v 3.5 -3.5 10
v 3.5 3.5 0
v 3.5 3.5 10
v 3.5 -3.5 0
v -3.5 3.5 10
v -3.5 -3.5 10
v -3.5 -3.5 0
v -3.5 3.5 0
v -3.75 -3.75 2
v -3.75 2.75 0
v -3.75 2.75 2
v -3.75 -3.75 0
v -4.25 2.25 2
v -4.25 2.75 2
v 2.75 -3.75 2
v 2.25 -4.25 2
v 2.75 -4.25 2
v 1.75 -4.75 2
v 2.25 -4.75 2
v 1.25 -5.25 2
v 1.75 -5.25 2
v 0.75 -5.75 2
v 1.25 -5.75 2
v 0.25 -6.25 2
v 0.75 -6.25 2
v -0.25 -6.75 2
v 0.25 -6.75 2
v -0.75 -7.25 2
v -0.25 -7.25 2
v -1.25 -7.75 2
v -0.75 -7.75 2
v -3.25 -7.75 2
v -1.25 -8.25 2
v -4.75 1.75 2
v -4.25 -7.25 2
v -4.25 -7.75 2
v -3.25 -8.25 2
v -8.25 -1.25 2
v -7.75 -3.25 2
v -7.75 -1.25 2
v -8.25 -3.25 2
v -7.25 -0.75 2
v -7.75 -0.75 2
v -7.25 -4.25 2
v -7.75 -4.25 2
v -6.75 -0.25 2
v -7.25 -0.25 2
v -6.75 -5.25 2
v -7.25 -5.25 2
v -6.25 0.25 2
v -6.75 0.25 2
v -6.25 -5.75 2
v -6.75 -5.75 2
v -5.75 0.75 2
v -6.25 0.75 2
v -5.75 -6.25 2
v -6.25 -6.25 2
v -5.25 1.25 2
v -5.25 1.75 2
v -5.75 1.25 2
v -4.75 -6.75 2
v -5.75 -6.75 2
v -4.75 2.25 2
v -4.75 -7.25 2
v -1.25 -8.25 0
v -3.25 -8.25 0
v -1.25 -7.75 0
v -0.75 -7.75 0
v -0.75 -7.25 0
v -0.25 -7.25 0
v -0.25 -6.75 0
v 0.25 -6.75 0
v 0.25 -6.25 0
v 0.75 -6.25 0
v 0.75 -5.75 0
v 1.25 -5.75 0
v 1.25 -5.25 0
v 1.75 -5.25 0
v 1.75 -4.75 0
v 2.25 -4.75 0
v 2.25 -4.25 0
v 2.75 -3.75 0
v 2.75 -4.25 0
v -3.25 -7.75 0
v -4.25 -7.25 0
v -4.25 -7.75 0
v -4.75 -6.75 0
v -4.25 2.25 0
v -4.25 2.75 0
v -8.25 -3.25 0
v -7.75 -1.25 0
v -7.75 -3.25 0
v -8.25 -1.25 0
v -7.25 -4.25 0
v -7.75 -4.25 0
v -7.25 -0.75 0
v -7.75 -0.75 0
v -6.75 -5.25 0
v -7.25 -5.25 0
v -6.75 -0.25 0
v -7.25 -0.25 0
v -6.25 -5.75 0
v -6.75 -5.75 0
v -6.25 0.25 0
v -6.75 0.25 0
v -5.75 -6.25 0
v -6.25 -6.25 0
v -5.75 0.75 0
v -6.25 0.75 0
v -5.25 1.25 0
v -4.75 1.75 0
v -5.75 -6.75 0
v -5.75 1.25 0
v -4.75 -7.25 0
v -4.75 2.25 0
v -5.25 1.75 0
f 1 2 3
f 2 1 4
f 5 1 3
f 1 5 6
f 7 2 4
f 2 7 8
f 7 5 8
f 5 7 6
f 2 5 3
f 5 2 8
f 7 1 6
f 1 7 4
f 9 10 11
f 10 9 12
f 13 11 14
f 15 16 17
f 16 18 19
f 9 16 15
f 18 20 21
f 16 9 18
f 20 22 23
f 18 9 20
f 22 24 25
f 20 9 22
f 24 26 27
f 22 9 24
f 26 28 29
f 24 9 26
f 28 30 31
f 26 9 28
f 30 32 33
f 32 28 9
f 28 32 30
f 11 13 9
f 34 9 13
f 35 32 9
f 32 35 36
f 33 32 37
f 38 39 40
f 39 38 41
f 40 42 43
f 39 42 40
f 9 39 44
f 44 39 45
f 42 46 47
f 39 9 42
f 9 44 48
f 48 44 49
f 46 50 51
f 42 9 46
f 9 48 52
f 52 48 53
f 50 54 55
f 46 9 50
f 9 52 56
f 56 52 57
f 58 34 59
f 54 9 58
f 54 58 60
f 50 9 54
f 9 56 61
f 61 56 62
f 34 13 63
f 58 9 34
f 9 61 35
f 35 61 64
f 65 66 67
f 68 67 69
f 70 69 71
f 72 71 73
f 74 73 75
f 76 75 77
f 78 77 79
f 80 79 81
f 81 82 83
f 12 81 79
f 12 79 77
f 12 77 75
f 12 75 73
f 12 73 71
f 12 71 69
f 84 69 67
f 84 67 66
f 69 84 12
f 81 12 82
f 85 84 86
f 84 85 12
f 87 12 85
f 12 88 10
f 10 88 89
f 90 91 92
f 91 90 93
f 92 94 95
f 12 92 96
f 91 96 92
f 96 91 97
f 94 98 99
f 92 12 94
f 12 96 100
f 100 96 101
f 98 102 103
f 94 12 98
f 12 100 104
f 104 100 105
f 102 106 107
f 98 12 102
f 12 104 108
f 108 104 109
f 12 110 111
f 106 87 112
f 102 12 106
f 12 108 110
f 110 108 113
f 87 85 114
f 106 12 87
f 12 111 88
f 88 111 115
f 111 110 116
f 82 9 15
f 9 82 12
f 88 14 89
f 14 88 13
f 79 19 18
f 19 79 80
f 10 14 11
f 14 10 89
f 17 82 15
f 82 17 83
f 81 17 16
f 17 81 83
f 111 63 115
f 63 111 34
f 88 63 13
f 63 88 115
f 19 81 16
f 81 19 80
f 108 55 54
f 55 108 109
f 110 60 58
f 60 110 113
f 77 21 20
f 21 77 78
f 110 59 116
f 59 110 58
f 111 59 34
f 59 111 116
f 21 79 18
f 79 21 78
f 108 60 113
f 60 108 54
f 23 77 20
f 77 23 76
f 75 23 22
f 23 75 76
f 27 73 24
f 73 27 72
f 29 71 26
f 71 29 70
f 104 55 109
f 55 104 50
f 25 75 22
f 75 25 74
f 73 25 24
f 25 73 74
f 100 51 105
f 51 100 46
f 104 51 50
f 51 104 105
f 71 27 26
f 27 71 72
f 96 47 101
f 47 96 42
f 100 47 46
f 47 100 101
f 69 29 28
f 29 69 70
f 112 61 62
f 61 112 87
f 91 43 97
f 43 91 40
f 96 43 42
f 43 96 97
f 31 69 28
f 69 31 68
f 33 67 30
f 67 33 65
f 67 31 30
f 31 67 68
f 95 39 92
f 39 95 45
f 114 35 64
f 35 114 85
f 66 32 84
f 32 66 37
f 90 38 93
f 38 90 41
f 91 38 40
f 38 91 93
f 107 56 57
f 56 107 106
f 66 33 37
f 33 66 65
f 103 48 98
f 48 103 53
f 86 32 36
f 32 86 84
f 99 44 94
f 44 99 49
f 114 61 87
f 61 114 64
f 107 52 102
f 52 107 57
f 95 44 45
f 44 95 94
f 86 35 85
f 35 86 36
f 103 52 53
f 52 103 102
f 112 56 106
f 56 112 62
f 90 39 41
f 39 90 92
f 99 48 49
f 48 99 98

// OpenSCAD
translate([0, 0, 5]) color([0,1,0,0.9]) cube([7, 7, 10], center=true);
translate([-4.0, 0.0, 1]) color([1,0,0]) cube([0.5, 0.5, 2], center=true);
translate([0.0, -4.0, 1]) color([1,0,0]) cube([0.5, 0.5, 2], center=true);
translate([-4.0, -0.5, 1]) color([1,0,0]) cube([0.5, 0.5, 2], center=true);
translate([-4.0, 0.5, 1]) color([1,0,0]) cube([0.5, 0.5, 2], center=true);
translate([-0.5, -4.0, 1]) color([1,0,0]) cube([0.5, 0.5, 2], center=true);
translate([0.5, -4.0, 1]) color([1,0,0]) cube([0.5, 0.5, 2], center=true);
translate([-4.0, -1.0, 1]) color([1,0,0]) cube([0.5, 0.5, 2], center=true);
translate([-4.0, 1.0, 1]) color([1,0,0]) cube([0.5, 0.5, 2], center=true);
translate([-1.0, -4.0, 1]) color([1,0,0]) cube([0.5, 0.5, 2], center=true);
translate([1.0, -4.0, 1]) color([1,0,0]) cube([0.5, 0.5, 2], center=true);
translate([-4.0, -1.5, 1]) color([1,0,0]) cube([0.5, 0.5, 2], center=true);
translate([-4.0, 1.5, 1]) color([1,0,0]) cube([0.5, 0.5, 2], center=true);
translate([-1.5, -4.0, 1]) color([1,0,0]) cube([0.5, 0.5, 2], center=true);
translate([1.5, -4.0, 1]) color([1,0,0]) cube([0.5, 0.5, 2], center=true);
translate([-4.0, -2.0, 1]) color([1,0,0]) cube([0.5, 0.5, 2], center=true);
translate([-4.0, 2.0, 1]) color([1,0,0]) cube([0.5, 0.5, 2], center=true);
translate([-2.0, -4.0, 1]) color([1,0,0]) cube([0.5, 0.5, 2], center=true);
translate([2.0, -4.0, 1]) color([1,0,0]) cube([0.5, 0.5, 2], center=true);
translate([-4.5, 0.0, 1]) color([1,0,0]) cube([0.5, 0.5, 2], center=true);
translate([0.0, -4.5, 1]) color([1,0,0]) cube([0.5, 0.5, 2], center=true);
translate([-4.5, -0.5, 1]) color([1,0,0]) cube([0.5, 0.5, 2], center=true);
translate([-4.5, 0.5, 1]) color([1,0,0]) cube([0.5, 0.5, 2], center=true);
translate([-0.5, -4.5, 1]) color([1,0,0]) cube([0.5, 0.5, 2], center=true);
translate([0.5, -4.5, 1]) color([1,0,0]) cube([0.5, 0.5, 2], center=true);
translate([-4.5, -1.0, 1]) color([1,0,0]) cube([0.5, 0.5, 2], center=true);
translate([-4.5, 1.0, 1]) color([1,0,0]) cube([0.5, 0.5, 2], center=true);
translate([-1.0, -4.5, 1]) color([1,0,0]) cube([0.5, 0.5, 2], center=true);
translate([1.0, -4.5, 1]) color([1,0,0]) cube([0.5, 0.5, 2], center=true);
translate([-4.0, -2.5, 1]) color([1,0,0]) cube([0.5, 0.5, 2], center=true);
translate([-4.0, 2.5, 1]) color([1,0,0]) cube([0.5, 0.5, 2], center=true);
translate([-2.5, -4.0, 1]) color([1,0,0]) cube([0.5, 0.5, 2], center=true);
translate([2.5, -4.0, 1]) color([1,0,0]) cube([0.5, 0.5, 2], center=true);
translate([-4.5, -1.5, 1]) color([1,0,0]) cube([0.5, 0.5, 2], center=true);
translate([-4.5, 1.5, 1]) color([1,0,0]) cube([0.5, 0.5, 2], center=true);
translate([-1.5, -4.5, 1]) color([1,0,0]) cube([0.5, 0.5, 2], center=true);
translate([1.5, -4.5, 1]) color([1,0,0]) cube([0.5, 0.5, 2], center=true);
translate([-4.5, -2.0, 1]) color([1,0,0]) cube([0.5, 0.5, 2], center=true);
translate([-4.5, 2.0, 1]) color([1,0,0]) cube([0.5, 0.5, 2], center=true);
translate([-2.0, -4.5, 1]) color([1,0,0]) cube([0.5, 0.5, 2], center=true);
translate([2.0, -4.5, 1]) color([1,0,0]) cube([0.5, 0.5, 2], center=true);
translate([-5.0, 0.0, 1]) color([1,0,0]) cube([0.5, 0.5, 2], center=true);
translate([-4.0, -3.0, 1]) color([1,0,0]) cube([0.5, 0.5, 2], center=true);
translate([-3.0, -4.0, 1]) color([1,0,0]) cube([0.5, 0.5, 2], center=true);
translate([0.0, -5.0, 1]) color([1,0,0]) cube([0.5, 0.5, 2], center=true);
translate([-5.0, -0.5, 1]) color([1,0,0]) cube([0.5, 0.5, 2], center=true);
translate([-5.0, 0.5, 1]) color([1,0,0]) cube([0.5, 0.5, 2], center=true);
translate([-0.5, -5.0, 1]) color([1,0,0]) cube([0.5, 0.5, 2], center=true);
translate([0.5, -5.0, 1]) color([1,0,0]) cube([0.5, 0.5, 2], center=true);
translate([-5.0, -1.0, 1]) color([1,0,0]) cube([0.5, 0.5, 2], center=true);
translate([-5.0, 1.0, 1]) color([1,0,0]) cube([0.5, 0.5, 2], center=true);
translate([-1.0, -5.0, 1]) color([1,0,0]) cube([0.5, 0.5, 2], center=true);
translate([1.0, -5.0, 1]) color([1,0,0]) cube([0.5, 0.5, 2], center=true);
translate([-4.5, -2.5, 1]) color([1,0,0]) cube([0.5, 0.5, 2], center=true);
translate([-2.5, -4.5, 1]) color([1,0,0]) cube([0.5, 0.5, 2], center=true);
translate([-5.0, -1.5, 1]) color([1,0,0]) cube([0.5, 0.5, 2], center=true);
translate([-5.0, 1.5, 1]) color([1,0,0]) cube([0.5, 0.5, 2], center=true);
translate([-1.5, -5.0, 1]) color([1,0,0]) cube([0.5, 0.5, 2], center=true);
translate([1.5, -5.0, 1]) color([1,0,0]) cube([0.5, 0.5, 2], center=true);
translate([-4.0, -3.5, 1]) color([1,0,0]) cube([0.5, 0.5, 2], center=true);
translate([-3.5, -4.0, 1]) color([1,0,0]) cube([0.5, 0.5, 2], center=true);
translate([-5.0, -2.0, 1]) color([1,0,0]) cube([0.5, 0.5, 2], center=true);
translate([-2.0, -5.0, 1]) color([1,0,0]) cube([0.5, 0.5, 2], center=true);
translate([-4.5, -3.0, 1]) color([1,0,0]) cube([0.5, 0.5, 2], center=true);
translate([-3.0, -4.5, 1]) color([1,0,0]) cube([0.5, 0.5, 2], center=true);
translate([-5.5, 0.0, 1]) color([1,0,0]) cube([0.5, 0.5, 2], center=true);
translate([0.0, -5.5, 1]) color([1,0,0]) cube([0.5, 0.5, 2], center=true);
translate([-5.5, -0.5, 1]) color([1,0,0]) cube([0.5, 0.5, 2], center=true);
translate([-5.5, 0.5, 1]) color([1,0,0]) cube([0.5, 0.5, 2], center=true);
translate([-0.5, -5.5, 1]) color([1,0,0]) cube([0.5, 0.5, 2], center=true);
translate([0.5, -5.5, 1]) color([1,0,0]) cube([0.5, 0.5, 2], center=true);
translate([-5.5, -1.0, 1]) color([1,0,0]) cube([0.5, 0.5, 2], center=true);
translate([-5.5, 1.0, 1]) color([1,0,0]) cube([0.5, 0.5, 2], center=true);
translate([-5.0, -2.5, 1]) color([1,0,0]) cube([0.5, 0.5, 2], center=true);
translate([-2.5, -5.0, 1]) color([1,0,0]) cube([0.5, 0.5, 2], center=true);
translate([-1.0, -5.5, 1]) color([1,0,0]) cube([0.5, 0.5, 2], center=true);
translate([1.0, -5.5, 1]) color([1,0,0]) cube([0.5, 0.5, 2], center=true);
translate([-4.0, -4.0, 1]) color([1,0,0]) cube([0.5, 0.5, 2], center=true);
translate([-5.5, -1.5, 1]) color([1,0,0]) cube([0.5, 0.5, 2], center=true);
translate([-4.5, -3.5, 1]) color([1,0,0]) cube([0.5, 0.5, 2], center=true);
translate([-3.5, -4.5, 1]) color([1,0,0]) cube([0.5, 0.5, 2], center=true);
translate([-1.5, -5.5, 1]) color([1,0,0]) cube([0.5, 0.5, 2], center=true);
translate([-5.0, -3.0, 1]) color([1,0,0]) cube([0.5, 0.5, 2], center=true);
translate([-3.0, -5.0, 1]) color([1,0,0]) cube([0.5, 0.5, 2], center=true);
translate([-5.5, -2.0, 1]) color([1,0,0]) cube([0.5, 0.5, 2], center=true);
translate([-2.0, -5.5, 1]) color([1,0,0]) cube([0.5, 0.5, 2], center=true);
translate([-6.0, 0.0, 1]) color([1,0,0]) cube([0.5, 0.5, 2], center=true);
translate([0.0, -6.0, 1]) color([1,0,0]) cube([0.5, 0.5, 2], center=true);
translate([-6.0, -0.5, 1]) color([1,0,0]) cube([0.5, 0.5, 2], center=true);
translate([-6.0, 0.5, 1]) color([1,0,0]) cube([0.5, 0.5, 2], center=true);
translate([-4.5, -4.0, 1]) color([1,0,0]) cube([0.5, 0.5, 2], center=true);
translate([-4.0, -4.5, 1]) color([1,0,0]) cube([0.5, 0.5, 2], center=true);
translate([-0.5, -6.0, 1]) color([1,0,0]) cube([0.5, 0.5, 2], center=true);
translate([0.5, -6.0, 1]) color([1,0,0]) cube([0.5, 0.5, 2], center=true);
translate([-5.5, -2.5, 1]) color([1,0,0]) cube([0.5, 0.5, 2], center=true);
translate([-2.5, -5.5, 1]) color([1,0,0]) cube([0.5, 0.5, 2], center=true);
translate([-6.0, -1.0, 1]) color([1,0,0]) cube([0.5, 0.5, 2], center=true);
translate([-1.0, -6.0, 1]) color([1,0,0]) cube([0.5, 0.5, 2], center=true);
translate([-5.0, -3.5, 1]) color([1,0,0]) cube([0.5, 0.5, 2], center=true);
translate([-3.5, -5.0, 1]) color([1,0,0]) cube([0.5, 0.5, 2], center=true);
translate([-6.0, -1.5, 1]) color([1,0,0]) cube([0.5, 0.5, 2], center=true);
translate([-1.5, -6.0, 1]) color([1,0,0]) cube([0.5, 0.5, 2], center=true);
translate([-5.5, -3.0, 1]) color([1,0,0]) cube([0.5, 0.5, 2], center=true);
translate([-3.0, -5.5, 1]) color([1,0,0]) cube([0.5, 0.5, 2], center=true);
translate([-6.0, -2.0, 1]) color([1,0,0]) cube([0.5, 0.5, 2], center=true);
translate([-2.0, -6.0, 1]) color([1,0,0]) cube([0.5, 0.5, 2], center=true);
translate([-4.5, -4.5, 1]) color([1,0,0]) cube([0.5, 0.5, 2], center=true);
translate([-5.0, -4.0, 1]) color([1,0,0]) cube([0.5, 0.5, 2], center=true);
translate([-4.0, -5.0, 1]) color([1,0,0]) cube([0.5, 0.5, 2], center=true);
translate([-6.5, 0.0, 1]) color([1,0,0]) cube([0.5, 0.5, 2], center=true);
translate([-6.0, -2.5, 1]) color([1,0,0]) cube([0.5, 0.5, 2], center=true);
translate([-2.5, -6.0, 1]) color([1,0,0]) cube([0.5, 0.5, 2], center=true);
translate([0.0, -6.5, 1]) color([1,0,0]) cube([0.5, 0.5, 2], center=true);
translate([-6.5, -0.5, 1]) color([1,0,0]) cube([0.5, 0.5, 2], center=true);
translate([-5.5, -3.5, 1]) color([1,0,0]) cube([0.5, 0.5, 2], center=true);
translate([-3.5, -5.5, 1]) color([1,0,0]) cube([0.5, 0.5, 2], center=true);
translate([-0.5, -6.5, 1]) color([1,0,0]) cube([0.5, 0.5, 2], center=true);
translate([-6.5, -1.0, 1]) color([1,0,0]) cube([0.5, 0.5, 2], center=true);
translate([-1.0, -6.5, 1]) color([1,0,0]) cube([0.5, 0.5, 2], center=true);
translate([-6.5, -1.5, 1]) color([1,0,0]) cube([0.5, 0.5, 2], center=true);
translate([-1.5, -6.5, 1]) color([1,0,0]) cube([0.5, 0.5, 2], center=true);
translate([-6.0, -3.0, 1]) color([1,0,0]) cube([0.5, 0.5, 2], center=true);
translate([-3.0, -6.0, 1]) color([1,0,0]) cube([0.5, 0.5, 2], center=true);
translate([-5.0, -4.5, 1]) color([1,0,0]) cube([0.5, 0.5, 2], center=true);
translate([-4.5, -5.0, 1]) color([1,0,0]) cube([0.5, 0.5, 2], center=true);
translate([-6.5, -2.0, 1]) color([1,0,0]) cube([0.5, 0.5, 2], center=true);
translate([-5.5, -4.0, 1]) color([1,0,0]) cube([0.5, 0.5, 2], center=true);
translate([-4.0, -5.5, 1]) color([1,0,0]) cube([0.5, 0.5, 2], center=true);
translate([-2.0, -6.5, 1]) color([1,0,0]) cube([0.5, 0.5, 2], center=true);
translate([-6.0, -3.5, 1]) color([1,0,0]) cube([0.5, 0.5, 2], center=true);
translate([-3.5, -6.0, 1]) color([1,0,0]) cube([0.5, 0.5, 2], center=true);
translate([-6.5, -2.5, 1]) color([1,0,0]) cube([0.5, 0.5, 2], center=true);
translate([-2.5, -6.5, 1]) color([1,0,0]) cube([0.5, 0.5, 2], center=true);
translate([-7.0, -0.5, 1]) color([1,0,0]) cube([0.5, 0.5, 2], center=true);
translate([-0.5, -7.0, 1]) color([1,0,0]) cube([0.5, 0.5, 2], center=true);
translate([-7.0, -1.0, 1]) color([1,0,0]) cube([0.5, 0.5, 2], center=true);
translate([-5.0, -5.0, 1]) color([1,0,0]) cube([0.5, 0.5, 2], center=true);
translate([-1.0, -7.0, 1]) color([1,0,0]) cube([0.5, 0.5, 2], center=true);
translate([-5.5, -4.5, 1]) color([1,0,0]) cube([0.5, 0.5, 2], center=true);
translate([-4.5, -5.5, 1]) color([1,0,0]) cube([0.5, 0.5, 2], center=true);
translate([-7.0, -1.5, 1]) color([1,0,0]) cube([0.5, 0.5, 2], center=true);
translate([-6.5, -3.0, 1]) color([1,0,0]) cube([0.5, 0.5, 2], center=true);
translate([-3.0, -6.5, 1]) color([1,0,0]) cube([0.5, 0.5, 2], center=true);
translate([-1.5, -7.0, 1]) color([1,0,0]) cube([0.5, 0.5, 2], center=true);
translate([-6.0, -4.0, 1]) color([1,0,0]) cube([0.5, 0.5, 2], center=true);
translate([-4.0, -6.0, 1]) color([1,0,0]) cube([0.5, 0.5, 2], center=true);
translate([-7.0, -2.0, 1]) color([1,0,0]) cube([0.5, 0.5, 2], center=true);
translate([-2.0, -7.0, 1]) color([1,0,0]) cube([0.5, 0.5, 2], center=true);
translate([-6.5, -3.5, 1]) color([1,0,0]) cube([0.5, 0.5, 2], center=true);
translate([-3.5, -6.5, 1]) color([1,0,0]) cube([0.5, 0.5, 2], center=true);
translate([-7.0, -2.5, 1]) color([1,0,0]) cube([0.5, 0.5, 2], center=true);
translate([-5.5, -5.0, 1]) color([1,0,0]) cube([0.5, 0.5, 2], center=true);
translate([-5.0, -5.5, 1]) color([1,0,0]) cube([0.5, 0.5, 2], center=true);
translate([-2.5, -7.0, 1]) color([1,0,0]) cube([0.5, 0.5, 2], center=true);
translate([-6.0, -4.5, 1]) color([1,0,0]) cube([0.5, 0.5, 2], center=true);
translate([-4.5, -6.0, 1]) color([1,0,0]) cube([0.5, 0.5, 2], center=true);
translate([-7.5, -1.0, 1]) color([1,0,0]) cube([0.5, 0.5, 2], center=true);
translate([-1.0, -7.5, 1]) color([1,0,0]) cube([0.5, 0.5, 2], center=true);
translate([-7.0, -3.0, 1]) color([1,0,0]) cube([0.5, 0.5, 2], center=true);
translate([-3.0, -7.0, 1]) color([1,0,0]) cube([0.5, 0.5, 2], center=true);
translate([-6.5, -4.0, 1]) color([1,0,0]) cube([0.5, 0.5, 2], center=true);
translate([-4.0, -6.5, 1]) color([1,0,0]) cube([0.5, 0.5, 2], center=true);
translate([-7.5, -1.5, 1]) color([1,0,0]) cube([0.5, 0.5, 2], center=true);
translate([-1.5, -7.5, 1]) color([1,0,0]) cube([0.5, 0.5, 2], center=true);
translate([-7.5, -2.0, 1]) color([1,0,0]) cube([0.5, 0.5, 2], center=true);
translate([-2.0, -7.5, 1]) color([1,0,0]) cube([0.5, 0.5, 2], center=true);
translate([-5.5, -5.5, 1]) color([1,0,0]) cube([0.5, 0.5, 2], center=true);
translate([-6.0, -5.0, 1]) color([1,0,0]) cube([0.5, 0.5, 2], center=true);
translate([-5.0, -6.0, 1]) color([1,0,0]) cube([0.5, 0.5, 2], center=true);
translate([-7.0, -3.5, 1]) color([1,0,0]) cube([0.5, 0.5, 2], center=true);
translate([-3.5, -7.0, 1]) color([1,0,0]) cube([0.5, 0.5, 2], center=true);
translate([-7.5, -2.5, 1]) color([1,0,0]) cube([0.5, 0.5, 2], center=true);
translate([-6.5, -4.5, 1]) color([1,0,0]) cube([0.5, 0.5, 2], center=true);
translate([-4.5, -6.5, 1]) color([1,0,0]) cube([0.5, 0.5, 2], center=true);
translate([-2.5, -7.5, 1]) color([1,0,0]) cube([0.5, 0.5, 2], center=true);
translate([-7.0, -4.0, 1]) color([1,0,0]) cube([0.5, 0.5, 2], center=true);
translate([-4.0, -7.0, 1]) color([1,0,0]) cube([0.5, 0.5, 2], center=true);
translate([-7.5, -3.0, 1]) color([1,0,0]) cube([0.5, 0.5, 2], center=true);
translate([-3.0, -7.5, 1]) color([1,0,0]) cube([0.5, 0.5, 2], center=true);
translate([-8.0, -1.5, 1]) color([1,0,0]) cube([0.5, 0.5, 2], center=true);
translate([-6.0, -5.5, 1]) color([1,0,0]) cube([0.5, 0.5, 2], center=true);
translate([-5.5, -6.0, 1]) color([1,0,0]) cube([0.5, 0.5, 2], center=true);
translate([-1.5, -8.0, 1]) color([1,0,0]) cube([0.5, 0.5, 2], center=true);
translate([-6.5, -5.0, 1]) color([1,0,0]) cube([0.5, 0.5, 2], center=true);
translate([-5.0, -6.5, 1]) color([1,0,0]) cube([0.5, 0.5, 2], center=true);
translate([-8.0, -2.0, 1]) color([1,0,0]) cube([0.5, 0.5, 2], center=true);
translate([-2.0, -8.0, 1]) color([1,0,0]) cube([0.5, 0.5, 2], center=true);
translate([-7.5, -3.5, 1]) color([1,0,0]) cube([0.5, 0.5, 2], center=true);
translate([-3.5, -7.5, 1]) color([1,0,0]) cube([0.5, 0.5, 2], center=true);
translate([-7.0, -4.5, 1]) color([1,0,0]) cube([0.5, 0.5, 2], center=true);
translate([-4.5, -7.0, 1]) color([1,0,0]) cube([0.5, 0.5, 2], center=true);
translate([-8.0, -2.5, 1]) color([1,0,0]) cube([0.5, 0.5, 2], center=true);
translate([-2.5, -8.0, 1]) color([1,0,0]) cube([0.5, 0.5, 2], center=true);
translate([-6.0, -6.0, 1]) color([1,0,0]) cube([0.5, 0.5, 2], center=true);
translate([-7.5, -4.0, 1]) color([1,0,0]) cube([0.5, 0.5, 2], center=true);
translate([-4.0, -7.5, 1]) color([1,0,0]) cube([0.5, 0.5, 2], center=true);
translate([-6.5, -5.5, 1]) color([1,0,0]) cube([0.5, 0.5, 2], center=true);
translate([-5.5, -6.5, 1]) color([1,0,0]) cube([0.5, 0.5, 2], center=true);
translate([-8.0, -3.0, 1]) color([1,0,0]) cube([0.5, 0.5, 2], center=true);
translate([-3.0, -8.0, 1]) color([1,0,0]) cube([0.5, 0.5, 2], center=true);
translate([-7.0, -5.0, 1]) color([1,0,0]) cube([0.5, 0.5, 2], center=true);
